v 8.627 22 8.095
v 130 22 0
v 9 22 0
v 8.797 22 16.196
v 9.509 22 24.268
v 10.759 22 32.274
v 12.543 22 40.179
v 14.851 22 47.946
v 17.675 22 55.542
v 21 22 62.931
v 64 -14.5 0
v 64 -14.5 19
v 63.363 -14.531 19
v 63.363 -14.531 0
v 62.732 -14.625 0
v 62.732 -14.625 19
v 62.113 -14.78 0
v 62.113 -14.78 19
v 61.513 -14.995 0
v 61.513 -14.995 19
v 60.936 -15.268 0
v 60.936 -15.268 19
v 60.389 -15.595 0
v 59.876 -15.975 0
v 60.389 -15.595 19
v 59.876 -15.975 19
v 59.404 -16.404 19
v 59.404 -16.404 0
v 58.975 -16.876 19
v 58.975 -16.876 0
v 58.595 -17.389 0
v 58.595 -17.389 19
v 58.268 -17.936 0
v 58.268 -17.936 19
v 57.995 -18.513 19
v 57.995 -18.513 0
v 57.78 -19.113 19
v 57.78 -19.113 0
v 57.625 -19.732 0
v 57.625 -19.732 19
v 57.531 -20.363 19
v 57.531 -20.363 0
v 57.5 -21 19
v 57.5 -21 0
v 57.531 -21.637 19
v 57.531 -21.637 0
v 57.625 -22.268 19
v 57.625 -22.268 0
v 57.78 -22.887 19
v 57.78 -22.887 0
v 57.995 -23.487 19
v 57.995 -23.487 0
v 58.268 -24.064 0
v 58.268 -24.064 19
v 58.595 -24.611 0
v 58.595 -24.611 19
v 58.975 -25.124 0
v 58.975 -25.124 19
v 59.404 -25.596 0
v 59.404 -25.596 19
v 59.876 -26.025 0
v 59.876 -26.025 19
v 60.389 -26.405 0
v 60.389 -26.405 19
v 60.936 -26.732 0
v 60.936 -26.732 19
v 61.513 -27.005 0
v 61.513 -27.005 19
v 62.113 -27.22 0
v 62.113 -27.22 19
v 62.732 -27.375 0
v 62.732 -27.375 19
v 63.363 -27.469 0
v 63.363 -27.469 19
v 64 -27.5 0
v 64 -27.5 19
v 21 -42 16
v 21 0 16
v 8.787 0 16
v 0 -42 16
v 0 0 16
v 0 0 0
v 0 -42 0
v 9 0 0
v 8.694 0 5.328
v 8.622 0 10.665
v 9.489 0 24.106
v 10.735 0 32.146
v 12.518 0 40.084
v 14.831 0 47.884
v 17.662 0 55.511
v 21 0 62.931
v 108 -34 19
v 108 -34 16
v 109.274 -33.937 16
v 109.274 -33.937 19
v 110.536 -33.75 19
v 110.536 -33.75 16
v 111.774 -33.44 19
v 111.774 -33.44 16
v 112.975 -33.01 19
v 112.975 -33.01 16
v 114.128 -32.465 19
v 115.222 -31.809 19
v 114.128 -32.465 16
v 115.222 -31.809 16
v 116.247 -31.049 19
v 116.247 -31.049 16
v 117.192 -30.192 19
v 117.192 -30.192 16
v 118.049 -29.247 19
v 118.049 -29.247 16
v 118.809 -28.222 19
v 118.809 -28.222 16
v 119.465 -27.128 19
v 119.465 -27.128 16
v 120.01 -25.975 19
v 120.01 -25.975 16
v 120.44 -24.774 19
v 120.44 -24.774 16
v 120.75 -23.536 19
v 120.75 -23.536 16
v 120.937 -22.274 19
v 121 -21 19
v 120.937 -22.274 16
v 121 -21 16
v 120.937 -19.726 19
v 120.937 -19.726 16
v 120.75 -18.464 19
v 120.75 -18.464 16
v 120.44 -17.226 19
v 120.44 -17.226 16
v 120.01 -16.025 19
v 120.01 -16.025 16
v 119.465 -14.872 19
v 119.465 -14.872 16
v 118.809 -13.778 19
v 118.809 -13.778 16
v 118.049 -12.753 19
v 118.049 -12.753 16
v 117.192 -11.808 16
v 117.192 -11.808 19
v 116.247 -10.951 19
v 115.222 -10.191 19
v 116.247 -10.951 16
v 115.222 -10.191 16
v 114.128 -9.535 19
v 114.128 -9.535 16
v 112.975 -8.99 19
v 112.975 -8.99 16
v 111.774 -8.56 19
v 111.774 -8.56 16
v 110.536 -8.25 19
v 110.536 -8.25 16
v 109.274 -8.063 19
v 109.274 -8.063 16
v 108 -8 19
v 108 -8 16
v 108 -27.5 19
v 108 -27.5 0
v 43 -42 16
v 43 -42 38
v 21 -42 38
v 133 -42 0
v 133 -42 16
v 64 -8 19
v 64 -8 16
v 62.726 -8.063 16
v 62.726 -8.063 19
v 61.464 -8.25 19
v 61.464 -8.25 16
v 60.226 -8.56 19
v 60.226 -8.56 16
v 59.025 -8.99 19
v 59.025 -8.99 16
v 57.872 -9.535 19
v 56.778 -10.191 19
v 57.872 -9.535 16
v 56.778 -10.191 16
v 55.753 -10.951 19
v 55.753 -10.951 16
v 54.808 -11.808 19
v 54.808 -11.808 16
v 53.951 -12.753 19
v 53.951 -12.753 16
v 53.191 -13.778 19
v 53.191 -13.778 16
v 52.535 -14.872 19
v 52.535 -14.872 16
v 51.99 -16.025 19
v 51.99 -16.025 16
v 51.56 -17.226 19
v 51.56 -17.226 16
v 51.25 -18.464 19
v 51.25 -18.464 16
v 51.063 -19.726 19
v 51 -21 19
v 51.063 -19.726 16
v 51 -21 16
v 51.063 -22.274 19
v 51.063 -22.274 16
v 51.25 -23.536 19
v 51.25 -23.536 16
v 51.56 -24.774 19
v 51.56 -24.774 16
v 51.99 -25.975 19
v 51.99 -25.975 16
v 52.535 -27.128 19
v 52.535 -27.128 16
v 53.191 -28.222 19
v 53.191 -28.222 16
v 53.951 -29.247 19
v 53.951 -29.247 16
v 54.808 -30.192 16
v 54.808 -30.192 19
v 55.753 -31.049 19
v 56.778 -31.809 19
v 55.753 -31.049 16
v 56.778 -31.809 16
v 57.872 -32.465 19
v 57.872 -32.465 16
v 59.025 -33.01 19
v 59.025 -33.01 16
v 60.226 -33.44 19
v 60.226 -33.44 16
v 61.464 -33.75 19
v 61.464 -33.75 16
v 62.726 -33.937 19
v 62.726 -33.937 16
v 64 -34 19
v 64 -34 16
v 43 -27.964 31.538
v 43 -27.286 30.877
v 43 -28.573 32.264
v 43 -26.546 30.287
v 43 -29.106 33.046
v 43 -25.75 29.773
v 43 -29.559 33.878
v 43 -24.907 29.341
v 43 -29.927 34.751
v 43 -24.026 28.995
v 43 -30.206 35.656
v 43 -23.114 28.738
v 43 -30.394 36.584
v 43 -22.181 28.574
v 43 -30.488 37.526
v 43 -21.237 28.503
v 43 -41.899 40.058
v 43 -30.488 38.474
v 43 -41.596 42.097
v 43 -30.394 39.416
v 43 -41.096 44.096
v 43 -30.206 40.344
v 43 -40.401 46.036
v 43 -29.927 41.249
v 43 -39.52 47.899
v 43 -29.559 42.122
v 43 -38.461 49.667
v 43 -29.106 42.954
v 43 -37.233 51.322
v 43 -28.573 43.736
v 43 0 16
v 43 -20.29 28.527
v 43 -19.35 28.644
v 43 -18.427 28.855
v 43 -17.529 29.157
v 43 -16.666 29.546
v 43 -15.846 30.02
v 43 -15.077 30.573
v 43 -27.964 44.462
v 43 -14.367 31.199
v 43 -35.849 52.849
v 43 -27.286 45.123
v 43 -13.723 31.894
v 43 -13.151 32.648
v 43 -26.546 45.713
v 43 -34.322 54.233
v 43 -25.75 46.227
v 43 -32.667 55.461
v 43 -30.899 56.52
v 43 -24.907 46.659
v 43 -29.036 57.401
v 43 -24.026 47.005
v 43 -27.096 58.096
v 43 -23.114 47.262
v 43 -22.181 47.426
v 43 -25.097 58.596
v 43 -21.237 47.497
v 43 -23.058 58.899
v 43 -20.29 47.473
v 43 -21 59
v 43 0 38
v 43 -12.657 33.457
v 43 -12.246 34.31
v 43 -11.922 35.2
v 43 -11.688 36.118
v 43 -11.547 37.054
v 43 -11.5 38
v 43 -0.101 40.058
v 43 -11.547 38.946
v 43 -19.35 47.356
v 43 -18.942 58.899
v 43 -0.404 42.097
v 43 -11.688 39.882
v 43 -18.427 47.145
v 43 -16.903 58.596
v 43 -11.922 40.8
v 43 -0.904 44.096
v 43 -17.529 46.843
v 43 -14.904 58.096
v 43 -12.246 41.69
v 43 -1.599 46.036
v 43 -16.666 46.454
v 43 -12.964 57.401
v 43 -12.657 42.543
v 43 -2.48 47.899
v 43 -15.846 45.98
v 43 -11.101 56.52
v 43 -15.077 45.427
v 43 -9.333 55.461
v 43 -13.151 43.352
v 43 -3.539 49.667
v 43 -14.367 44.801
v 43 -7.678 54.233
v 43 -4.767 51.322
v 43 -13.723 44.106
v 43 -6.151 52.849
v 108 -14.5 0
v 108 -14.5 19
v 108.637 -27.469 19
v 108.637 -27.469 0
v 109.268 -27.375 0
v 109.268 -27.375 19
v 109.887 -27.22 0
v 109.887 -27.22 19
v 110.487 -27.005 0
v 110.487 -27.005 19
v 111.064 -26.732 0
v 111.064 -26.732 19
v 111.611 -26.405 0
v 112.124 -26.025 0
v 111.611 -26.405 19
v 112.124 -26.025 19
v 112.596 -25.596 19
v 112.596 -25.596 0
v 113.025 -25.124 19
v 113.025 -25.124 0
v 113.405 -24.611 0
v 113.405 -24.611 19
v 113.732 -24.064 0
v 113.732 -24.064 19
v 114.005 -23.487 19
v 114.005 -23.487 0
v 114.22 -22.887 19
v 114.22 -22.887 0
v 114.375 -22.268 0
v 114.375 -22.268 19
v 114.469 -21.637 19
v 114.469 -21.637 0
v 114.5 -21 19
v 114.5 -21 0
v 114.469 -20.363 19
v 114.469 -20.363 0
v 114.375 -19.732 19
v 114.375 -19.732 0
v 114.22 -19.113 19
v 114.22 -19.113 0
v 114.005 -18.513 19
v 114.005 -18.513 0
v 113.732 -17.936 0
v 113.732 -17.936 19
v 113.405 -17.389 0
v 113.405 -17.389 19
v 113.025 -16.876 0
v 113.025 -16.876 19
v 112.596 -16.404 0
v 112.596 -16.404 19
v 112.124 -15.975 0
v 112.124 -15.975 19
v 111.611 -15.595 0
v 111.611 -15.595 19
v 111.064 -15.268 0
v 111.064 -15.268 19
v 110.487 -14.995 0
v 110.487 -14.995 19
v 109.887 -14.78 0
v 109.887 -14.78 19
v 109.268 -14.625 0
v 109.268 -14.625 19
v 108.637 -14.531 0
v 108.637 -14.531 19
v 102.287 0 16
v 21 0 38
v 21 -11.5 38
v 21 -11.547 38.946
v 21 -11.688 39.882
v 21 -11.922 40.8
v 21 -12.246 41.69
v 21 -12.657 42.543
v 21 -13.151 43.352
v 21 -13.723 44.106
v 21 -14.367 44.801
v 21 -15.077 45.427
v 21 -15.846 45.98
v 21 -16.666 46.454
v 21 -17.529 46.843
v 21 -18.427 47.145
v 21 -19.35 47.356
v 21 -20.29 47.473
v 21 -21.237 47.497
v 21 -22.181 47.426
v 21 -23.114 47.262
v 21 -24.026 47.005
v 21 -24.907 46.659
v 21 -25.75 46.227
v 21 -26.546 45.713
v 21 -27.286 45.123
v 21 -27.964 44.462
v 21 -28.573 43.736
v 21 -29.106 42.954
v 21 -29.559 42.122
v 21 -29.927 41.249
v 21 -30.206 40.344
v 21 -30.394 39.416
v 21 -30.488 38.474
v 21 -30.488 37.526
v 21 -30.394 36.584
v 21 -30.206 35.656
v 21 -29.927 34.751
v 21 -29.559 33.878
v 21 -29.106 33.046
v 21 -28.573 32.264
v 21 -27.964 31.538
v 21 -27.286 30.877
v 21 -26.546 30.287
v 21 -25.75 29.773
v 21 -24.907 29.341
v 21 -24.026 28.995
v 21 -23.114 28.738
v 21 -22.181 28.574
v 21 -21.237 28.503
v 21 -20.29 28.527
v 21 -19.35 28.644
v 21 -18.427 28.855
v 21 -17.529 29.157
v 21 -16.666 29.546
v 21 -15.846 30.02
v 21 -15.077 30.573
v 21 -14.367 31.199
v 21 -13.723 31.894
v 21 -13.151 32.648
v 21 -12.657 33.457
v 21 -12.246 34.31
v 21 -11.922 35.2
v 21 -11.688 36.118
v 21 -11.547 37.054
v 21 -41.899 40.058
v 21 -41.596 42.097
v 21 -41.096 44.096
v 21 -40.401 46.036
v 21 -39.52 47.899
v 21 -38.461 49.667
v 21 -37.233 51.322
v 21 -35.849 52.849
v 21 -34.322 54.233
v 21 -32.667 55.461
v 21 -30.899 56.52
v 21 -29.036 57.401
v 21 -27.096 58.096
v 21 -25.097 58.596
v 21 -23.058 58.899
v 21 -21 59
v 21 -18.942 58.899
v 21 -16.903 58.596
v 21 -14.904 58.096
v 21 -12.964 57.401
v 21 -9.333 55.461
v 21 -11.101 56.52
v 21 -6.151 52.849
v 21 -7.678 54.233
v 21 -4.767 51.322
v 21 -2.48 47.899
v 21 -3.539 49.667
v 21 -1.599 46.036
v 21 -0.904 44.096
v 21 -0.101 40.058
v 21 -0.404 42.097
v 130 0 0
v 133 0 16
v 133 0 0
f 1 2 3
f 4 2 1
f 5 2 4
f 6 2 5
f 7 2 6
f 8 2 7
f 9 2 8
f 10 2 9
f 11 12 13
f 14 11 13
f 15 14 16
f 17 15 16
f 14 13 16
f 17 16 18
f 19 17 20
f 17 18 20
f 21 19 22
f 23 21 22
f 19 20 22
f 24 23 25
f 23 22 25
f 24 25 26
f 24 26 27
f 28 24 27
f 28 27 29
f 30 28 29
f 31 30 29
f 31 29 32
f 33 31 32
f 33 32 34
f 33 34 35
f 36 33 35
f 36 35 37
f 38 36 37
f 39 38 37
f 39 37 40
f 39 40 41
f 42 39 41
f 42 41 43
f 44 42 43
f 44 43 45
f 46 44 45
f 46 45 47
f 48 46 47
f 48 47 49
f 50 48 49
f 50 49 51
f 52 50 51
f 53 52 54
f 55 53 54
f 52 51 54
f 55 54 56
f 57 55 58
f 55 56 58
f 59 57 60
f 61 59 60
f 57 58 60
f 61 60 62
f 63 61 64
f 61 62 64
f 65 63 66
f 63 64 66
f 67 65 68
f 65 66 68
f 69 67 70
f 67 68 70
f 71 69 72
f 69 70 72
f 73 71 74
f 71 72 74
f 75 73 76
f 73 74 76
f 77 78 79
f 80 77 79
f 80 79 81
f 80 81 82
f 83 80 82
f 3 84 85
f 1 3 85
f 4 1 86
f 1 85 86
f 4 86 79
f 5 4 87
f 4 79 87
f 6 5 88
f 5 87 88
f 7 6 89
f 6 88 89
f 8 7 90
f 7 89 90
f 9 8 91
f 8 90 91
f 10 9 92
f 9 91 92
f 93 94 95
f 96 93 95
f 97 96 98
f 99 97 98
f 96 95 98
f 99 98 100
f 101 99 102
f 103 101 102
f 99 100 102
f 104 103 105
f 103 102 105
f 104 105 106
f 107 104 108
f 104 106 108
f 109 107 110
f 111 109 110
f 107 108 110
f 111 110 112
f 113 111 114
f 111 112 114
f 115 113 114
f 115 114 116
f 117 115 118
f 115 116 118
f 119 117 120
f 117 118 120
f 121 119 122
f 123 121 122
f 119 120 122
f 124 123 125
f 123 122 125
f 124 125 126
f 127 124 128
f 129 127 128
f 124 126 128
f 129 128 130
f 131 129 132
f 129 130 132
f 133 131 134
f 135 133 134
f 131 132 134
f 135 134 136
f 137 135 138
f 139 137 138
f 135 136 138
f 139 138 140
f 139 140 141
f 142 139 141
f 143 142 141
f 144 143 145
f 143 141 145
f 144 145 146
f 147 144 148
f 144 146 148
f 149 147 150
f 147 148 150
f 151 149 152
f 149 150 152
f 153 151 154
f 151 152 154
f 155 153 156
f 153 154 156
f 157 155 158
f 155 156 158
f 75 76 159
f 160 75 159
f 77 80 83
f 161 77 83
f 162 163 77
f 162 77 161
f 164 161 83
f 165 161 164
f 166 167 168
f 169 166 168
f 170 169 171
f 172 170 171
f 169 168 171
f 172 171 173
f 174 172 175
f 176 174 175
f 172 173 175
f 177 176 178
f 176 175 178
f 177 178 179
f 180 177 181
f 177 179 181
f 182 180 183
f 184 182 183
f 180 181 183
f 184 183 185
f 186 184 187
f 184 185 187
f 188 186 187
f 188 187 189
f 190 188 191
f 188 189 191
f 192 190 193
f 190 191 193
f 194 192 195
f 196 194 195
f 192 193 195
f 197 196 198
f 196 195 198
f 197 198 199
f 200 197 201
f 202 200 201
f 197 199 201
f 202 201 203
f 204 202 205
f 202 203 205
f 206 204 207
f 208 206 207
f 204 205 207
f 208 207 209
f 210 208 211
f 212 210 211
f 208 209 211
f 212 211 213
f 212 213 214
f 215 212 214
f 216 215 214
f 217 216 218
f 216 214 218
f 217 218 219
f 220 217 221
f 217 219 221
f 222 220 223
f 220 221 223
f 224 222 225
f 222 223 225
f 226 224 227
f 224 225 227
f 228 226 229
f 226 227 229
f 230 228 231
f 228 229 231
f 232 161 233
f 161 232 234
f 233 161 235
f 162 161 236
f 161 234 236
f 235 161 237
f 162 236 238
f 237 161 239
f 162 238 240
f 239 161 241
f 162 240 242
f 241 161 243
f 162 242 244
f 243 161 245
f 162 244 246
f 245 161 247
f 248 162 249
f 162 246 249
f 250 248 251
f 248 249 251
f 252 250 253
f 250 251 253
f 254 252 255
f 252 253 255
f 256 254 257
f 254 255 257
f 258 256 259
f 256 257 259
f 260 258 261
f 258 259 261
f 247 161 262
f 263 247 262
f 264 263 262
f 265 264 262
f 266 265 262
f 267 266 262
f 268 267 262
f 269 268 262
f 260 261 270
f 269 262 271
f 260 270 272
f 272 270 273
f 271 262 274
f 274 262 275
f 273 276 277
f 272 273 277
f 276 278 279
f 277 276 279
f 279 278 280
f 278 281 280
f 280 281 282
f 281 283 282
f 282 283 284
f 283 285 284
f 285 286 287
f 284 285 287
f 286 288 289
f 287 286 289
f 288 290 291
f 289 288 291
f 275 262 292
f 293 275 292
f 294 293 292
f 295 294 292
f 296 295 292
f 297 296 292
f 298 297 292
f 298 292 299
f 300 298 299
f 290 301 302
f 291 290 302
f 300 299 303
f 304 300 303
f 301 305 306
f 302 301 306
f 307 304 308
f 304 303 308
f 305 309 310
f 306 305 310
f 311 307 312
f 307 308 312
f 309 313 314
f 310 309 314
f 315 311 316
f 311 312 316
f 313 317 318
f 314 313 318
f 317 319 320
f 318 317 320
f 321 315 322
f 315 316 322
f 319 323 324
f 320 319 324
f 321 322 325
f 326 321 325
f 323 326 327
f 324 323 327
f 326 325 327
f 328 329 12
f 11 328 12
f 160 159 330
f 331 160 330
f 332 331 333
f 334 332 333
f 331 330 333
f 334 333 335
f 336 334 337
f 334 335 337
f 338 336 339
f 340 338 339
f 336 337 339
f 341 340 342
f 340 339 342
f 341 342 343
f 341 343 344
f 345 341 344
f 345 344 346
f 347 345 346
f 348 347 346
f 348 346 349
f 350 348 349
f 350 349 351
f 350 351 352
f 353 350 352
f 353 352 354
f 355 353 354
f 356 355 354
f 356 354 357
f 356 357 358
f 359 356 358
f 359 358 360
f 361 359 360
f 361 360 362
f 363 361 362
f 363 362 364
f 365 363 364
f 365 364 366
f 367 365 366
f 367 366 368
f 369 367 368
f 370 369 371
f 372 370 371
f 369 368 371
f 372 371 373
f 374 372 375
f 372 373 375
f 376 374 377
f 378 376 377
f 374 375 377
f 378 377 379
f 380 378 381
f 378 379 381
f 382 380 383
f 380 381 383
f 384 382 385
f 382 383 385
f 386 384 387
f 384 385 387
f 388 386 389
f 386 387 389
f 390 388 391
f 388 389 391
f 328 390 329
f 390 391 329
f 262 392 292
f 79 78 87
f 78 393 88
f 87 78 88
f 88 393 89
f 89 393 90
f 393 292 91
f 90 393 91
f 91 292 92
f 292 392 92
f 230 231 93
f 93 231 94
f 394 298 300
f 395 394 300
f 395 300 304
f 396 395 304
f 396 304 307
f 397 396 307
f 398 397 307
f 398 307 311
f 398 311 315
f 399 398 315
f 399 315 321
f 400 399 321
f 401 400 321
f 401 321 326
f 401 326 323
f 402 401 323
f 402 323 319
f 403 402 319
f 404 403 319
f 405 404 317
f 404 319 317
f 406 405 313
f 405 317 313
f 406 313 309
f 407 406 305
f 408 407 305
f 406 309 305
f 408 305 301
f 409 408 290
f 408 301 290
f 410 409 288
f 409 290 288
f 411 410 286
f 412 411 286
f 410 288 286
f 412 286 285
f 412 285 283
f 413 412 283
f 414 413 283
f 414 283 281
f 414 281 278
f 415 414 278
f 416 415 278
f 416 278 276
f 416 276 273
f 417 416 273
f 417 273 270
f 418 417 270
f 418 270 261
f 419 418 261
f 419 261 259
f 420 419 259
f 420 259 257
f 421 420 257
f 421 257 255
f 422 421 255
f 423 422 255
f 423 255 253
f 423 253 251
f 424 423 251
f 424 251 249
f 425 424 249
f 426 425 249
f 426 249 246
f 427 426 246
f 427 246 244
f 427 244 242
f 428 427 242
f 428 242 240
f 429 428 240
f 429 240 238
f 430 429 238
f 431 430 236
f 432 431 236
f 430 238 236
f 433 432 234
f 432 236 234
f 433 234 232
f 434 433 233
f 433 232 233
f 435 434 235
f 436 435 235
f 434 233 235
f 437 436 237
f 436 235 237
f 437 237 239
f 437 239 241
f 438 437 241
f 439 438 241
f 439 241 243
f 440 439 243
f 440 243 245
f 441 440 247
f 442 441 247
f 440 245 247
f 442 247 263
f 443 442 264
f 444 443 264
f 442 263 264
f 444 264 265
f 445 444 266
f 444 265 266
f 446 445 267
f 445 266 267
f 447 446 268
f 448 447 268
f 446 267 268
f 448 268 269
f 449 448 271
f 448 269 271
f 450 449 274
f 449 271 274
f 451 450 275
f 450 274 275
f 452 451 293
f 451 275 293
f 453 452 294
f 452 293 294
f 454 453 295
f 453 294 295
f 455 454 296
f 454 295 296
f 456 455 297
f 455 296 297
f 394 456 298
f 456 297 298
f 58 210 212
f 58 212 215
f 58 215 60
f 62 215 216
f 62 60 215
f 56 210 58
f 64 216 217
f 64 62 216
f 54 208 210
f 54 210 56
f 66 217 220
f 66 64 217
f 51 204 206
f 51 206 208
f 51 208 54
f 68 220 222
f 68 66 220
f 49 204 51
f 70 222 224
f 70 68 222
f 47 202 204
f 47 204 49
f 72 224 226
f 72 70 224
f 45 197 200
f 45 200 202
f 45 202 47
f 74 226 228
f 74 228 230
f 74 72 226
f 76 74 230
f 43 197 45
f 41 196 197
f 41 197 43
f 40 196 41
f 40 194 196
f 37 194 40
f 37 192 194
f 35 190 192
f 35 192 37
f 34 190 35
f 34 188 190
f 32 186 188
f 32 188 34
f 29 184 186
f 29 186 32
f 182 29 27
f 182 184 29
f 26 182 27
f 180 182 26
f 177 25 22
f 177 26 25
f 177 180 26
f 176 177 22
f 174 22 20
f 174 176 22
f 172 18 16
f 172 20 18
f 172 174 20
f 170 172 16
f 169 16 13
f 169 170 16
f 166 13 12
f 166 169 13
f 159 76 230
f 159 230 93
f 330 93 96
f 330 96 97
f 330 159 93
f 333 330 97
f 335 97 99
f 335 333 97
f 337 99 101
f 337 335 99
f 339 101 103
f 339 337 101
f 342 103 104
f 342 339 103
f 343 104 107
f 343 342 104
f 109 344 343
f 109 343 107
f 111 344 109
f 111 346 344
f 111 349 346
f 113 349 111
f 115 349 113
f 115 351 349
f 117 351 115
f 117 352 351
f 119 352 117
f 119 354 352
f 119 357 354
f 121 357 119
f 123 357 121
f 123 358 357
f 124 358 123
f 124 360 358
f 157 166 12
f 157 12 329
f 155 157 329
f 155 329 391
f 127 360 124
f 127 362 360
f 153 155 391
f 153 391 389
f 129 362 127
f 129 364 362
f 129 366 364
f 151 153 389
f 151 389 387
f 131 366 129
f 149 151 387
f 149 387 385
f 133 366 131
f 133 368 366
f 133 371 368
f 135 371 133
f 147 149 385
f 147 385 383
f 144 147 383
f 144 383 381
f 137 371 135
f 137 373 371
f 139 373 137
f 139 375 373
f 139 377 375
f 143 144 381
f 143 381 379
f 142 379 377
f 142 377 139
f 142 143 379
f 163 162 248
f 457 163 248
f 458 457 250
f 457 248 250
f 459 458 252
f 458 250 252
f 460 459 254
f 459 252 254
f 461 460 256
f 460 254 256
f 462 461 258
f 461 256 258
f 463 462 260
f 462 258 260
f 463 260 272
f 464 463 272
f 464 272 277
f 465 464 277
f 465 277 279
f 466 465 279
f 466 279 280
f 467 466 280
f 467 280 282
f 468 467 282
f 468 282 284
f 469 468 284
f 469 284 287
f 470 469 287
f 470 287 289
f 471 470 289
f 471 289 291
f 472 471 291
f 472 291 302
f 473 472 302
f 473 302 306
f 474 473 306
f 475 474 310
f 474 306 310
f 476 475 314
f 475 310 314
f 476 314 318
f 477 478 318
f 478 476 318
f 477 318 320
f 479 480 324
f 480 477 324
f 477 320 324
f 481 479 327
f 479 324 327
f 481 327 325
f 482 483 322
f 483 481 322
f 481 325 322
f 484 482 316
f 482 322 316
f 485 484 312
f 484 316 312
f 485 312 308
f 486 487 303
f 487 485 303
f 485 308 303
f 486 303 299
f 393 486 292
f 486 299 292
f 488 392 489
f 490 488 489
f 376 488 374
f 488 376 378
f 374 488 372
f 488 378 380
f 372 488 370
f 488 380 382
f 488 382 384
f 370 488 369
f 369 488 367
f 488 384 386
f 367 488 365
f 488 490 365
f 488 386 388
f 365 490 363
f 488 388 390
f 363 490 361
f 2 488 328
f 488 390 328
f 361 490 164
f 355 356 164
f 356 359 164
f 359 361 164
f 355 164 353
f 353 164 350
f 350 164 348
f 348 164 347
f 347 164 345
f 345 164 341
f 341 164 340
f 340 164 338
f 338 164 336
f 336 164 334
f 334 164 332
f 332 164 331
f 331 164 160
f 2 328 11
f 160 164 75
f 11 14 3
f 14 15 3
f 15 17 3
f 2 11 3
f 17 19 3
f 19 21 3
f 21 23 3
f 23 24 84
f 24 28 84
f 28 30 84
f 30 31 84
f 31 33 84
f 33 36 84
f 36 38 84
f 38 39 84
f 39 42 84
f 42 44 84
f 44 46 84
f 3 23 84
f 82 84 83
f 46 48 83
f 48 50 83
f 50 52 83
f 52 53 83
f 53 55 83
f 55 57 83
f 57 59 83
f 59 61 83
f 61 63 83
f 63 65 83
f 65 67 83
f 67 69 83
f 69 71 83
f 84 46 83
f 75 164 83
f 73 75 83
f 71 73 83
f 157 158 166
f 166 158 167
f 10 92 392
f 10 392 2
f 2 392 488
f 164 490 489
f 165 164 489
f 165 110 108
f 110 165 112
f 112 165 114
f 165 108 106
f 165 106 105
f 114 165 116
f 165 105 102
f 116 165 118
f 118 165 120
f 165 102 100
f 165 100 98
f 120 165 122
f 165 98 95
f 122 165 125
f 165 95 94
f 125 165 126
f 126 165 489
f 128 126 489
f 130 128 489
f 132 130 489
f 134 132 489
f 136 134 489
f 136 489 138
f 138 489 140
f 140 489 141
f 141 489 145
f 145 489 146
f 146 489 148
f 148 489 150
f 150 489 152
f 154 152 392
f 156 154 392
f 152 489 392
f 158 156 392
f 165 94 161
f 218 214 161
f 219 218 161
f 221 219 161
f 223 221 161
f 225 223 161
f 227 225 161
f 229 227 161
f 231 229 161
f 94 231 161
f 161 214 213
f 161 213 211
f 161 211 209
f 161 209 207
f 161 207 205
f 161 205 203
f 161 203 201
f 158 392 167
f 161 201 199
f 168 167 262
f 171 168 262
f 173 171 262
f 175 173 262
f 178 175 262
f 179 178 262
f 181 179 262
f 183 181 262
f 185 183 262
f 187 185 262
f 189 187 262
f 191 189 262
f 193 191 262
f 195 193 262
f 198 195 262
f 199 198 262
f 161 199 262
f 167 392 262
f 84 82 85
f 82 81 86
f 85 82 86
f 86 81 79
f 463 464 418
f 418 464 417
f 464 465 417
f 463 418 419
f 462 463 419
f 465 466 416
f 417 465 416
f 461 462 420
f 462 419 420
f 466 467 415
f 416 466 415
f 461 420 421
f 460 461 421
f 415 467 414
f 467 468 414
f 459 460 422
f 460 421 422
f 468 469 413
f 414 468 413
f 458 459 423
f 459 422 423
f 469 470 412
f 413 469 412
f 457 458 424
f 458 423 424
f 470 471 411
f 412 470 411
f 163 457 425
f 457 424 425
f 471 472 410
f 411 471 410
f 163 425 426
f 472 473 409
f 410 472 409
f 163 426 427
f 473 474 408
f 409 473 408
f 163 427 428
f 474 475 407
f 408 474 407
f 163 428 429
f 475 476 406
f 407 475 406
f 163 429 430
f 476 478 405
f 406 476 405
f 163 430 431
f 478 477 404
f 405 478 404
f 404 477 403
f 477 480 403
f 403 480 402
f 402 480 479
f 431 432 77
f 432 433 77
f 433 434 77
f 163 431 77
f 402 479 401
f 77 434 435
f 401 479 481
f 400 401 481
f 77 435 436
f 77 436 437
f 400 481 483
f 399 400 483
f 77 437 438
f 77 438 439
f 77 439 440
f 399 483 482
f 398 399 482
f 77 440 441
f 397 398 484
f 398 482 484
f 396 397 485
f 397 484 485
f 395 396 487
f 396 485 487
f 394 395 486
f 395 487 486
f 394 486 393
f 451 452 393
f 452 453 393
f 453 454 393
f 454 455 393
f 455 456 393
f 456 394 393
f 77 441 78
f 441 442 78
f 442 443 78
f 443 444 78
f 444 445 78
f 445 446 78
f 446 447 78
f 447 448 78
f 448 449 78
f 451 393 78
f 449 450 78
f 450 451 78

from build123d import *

# Parameters (mm, degrees)
F1_DEPTH  = 42
F2_R      = 9.5
F3_DEPTH  = 43.001
F5_DEPTH  = 43.001
F7_DEPTH  = 3
F9_DEPTH  = 19.001
F11_DEPTH = 22


with BuildPart() as f1:
    # F0 (on Front) → F1 (new body)
    with BuildSketch(Plane.XZ):
        Polygon((0, 16), (0, 0), (133, 0), (133, 16), (43, 16), (43, 60), (21, 60), (21, 16), align=None)
    extrude(amount=F1_DEPTH)

    # F2 (on face) → F3 (cut, through all)
    with BuildSketch(Plane.YZ.offset(43)):
        with Locations((-21, 38)):
            Circle(F2_R)
    extrude(amount=-F3_DEPTH, mode=Mode.SUBTRACT)

    # F4 (on face) → F5 (cut, through all)
    with BuildSketch(Plane.YZ.offset(43)):
        with BuildLine():
            Line((-42, 60), (-42, 38))
            ThreePointArc((-42, 38), (-21, 59), (0, 38))
            Line((0, 38), (0, 60))
            Line((0, 60), (-42, 60))
        make_face()
    extrude(amount=-F5_DEPTH, mode=Mode.SUBTRACT)

    # F6 (on face) → F7 (join)
    with BuildSketch(Plane.XY.offset(16)):
        with BuildLine():
            Line((108, -8), (64, -8))
            ThreePointArc((64, -8), (51, -21), (64, -34))
            Line((64, -34), (108, -34))
            ThreePointArc((108, -34), (121, -21), (108, -8))
        make_face()
    extrude(amount=F7_DEPTH)

    # F8 (on face) → F9 (cut, through all)
    with BuildSketch(Plane.XY.offset(19)):
        with BuildLine():
            Line((108, -14.5), (64, -14.5))
            ThreePointArc((64, -14.5), (57.5, -21), (64, -27.5))
            Line((64, -27.5), (108, -27.5))
            ThreePointArc((108, -27.5), (114.5, -21), (108, -14.5))
        make_face()
    extrude(amount=-F9_DEPTH, mode=Mode.SUBTRACT)

    # F10 (on face) → F11 (join)
    with BuildSketch(Plane(origin=(0, 0, 0), x_dir=(-1, 0, 0), z_dir=(0, 1, 0))):
        with BuildLine():
            Line((-21, 62.931179), (-130, 0))
            Line((-130, 0), (-9, 0))
            ThreePointArc((-9, 0), (-10.759382, 32.27421), (-21, 62.931179))
        make_face()
    extrude(amount=F11_DEPTH)


solid = f1.part
